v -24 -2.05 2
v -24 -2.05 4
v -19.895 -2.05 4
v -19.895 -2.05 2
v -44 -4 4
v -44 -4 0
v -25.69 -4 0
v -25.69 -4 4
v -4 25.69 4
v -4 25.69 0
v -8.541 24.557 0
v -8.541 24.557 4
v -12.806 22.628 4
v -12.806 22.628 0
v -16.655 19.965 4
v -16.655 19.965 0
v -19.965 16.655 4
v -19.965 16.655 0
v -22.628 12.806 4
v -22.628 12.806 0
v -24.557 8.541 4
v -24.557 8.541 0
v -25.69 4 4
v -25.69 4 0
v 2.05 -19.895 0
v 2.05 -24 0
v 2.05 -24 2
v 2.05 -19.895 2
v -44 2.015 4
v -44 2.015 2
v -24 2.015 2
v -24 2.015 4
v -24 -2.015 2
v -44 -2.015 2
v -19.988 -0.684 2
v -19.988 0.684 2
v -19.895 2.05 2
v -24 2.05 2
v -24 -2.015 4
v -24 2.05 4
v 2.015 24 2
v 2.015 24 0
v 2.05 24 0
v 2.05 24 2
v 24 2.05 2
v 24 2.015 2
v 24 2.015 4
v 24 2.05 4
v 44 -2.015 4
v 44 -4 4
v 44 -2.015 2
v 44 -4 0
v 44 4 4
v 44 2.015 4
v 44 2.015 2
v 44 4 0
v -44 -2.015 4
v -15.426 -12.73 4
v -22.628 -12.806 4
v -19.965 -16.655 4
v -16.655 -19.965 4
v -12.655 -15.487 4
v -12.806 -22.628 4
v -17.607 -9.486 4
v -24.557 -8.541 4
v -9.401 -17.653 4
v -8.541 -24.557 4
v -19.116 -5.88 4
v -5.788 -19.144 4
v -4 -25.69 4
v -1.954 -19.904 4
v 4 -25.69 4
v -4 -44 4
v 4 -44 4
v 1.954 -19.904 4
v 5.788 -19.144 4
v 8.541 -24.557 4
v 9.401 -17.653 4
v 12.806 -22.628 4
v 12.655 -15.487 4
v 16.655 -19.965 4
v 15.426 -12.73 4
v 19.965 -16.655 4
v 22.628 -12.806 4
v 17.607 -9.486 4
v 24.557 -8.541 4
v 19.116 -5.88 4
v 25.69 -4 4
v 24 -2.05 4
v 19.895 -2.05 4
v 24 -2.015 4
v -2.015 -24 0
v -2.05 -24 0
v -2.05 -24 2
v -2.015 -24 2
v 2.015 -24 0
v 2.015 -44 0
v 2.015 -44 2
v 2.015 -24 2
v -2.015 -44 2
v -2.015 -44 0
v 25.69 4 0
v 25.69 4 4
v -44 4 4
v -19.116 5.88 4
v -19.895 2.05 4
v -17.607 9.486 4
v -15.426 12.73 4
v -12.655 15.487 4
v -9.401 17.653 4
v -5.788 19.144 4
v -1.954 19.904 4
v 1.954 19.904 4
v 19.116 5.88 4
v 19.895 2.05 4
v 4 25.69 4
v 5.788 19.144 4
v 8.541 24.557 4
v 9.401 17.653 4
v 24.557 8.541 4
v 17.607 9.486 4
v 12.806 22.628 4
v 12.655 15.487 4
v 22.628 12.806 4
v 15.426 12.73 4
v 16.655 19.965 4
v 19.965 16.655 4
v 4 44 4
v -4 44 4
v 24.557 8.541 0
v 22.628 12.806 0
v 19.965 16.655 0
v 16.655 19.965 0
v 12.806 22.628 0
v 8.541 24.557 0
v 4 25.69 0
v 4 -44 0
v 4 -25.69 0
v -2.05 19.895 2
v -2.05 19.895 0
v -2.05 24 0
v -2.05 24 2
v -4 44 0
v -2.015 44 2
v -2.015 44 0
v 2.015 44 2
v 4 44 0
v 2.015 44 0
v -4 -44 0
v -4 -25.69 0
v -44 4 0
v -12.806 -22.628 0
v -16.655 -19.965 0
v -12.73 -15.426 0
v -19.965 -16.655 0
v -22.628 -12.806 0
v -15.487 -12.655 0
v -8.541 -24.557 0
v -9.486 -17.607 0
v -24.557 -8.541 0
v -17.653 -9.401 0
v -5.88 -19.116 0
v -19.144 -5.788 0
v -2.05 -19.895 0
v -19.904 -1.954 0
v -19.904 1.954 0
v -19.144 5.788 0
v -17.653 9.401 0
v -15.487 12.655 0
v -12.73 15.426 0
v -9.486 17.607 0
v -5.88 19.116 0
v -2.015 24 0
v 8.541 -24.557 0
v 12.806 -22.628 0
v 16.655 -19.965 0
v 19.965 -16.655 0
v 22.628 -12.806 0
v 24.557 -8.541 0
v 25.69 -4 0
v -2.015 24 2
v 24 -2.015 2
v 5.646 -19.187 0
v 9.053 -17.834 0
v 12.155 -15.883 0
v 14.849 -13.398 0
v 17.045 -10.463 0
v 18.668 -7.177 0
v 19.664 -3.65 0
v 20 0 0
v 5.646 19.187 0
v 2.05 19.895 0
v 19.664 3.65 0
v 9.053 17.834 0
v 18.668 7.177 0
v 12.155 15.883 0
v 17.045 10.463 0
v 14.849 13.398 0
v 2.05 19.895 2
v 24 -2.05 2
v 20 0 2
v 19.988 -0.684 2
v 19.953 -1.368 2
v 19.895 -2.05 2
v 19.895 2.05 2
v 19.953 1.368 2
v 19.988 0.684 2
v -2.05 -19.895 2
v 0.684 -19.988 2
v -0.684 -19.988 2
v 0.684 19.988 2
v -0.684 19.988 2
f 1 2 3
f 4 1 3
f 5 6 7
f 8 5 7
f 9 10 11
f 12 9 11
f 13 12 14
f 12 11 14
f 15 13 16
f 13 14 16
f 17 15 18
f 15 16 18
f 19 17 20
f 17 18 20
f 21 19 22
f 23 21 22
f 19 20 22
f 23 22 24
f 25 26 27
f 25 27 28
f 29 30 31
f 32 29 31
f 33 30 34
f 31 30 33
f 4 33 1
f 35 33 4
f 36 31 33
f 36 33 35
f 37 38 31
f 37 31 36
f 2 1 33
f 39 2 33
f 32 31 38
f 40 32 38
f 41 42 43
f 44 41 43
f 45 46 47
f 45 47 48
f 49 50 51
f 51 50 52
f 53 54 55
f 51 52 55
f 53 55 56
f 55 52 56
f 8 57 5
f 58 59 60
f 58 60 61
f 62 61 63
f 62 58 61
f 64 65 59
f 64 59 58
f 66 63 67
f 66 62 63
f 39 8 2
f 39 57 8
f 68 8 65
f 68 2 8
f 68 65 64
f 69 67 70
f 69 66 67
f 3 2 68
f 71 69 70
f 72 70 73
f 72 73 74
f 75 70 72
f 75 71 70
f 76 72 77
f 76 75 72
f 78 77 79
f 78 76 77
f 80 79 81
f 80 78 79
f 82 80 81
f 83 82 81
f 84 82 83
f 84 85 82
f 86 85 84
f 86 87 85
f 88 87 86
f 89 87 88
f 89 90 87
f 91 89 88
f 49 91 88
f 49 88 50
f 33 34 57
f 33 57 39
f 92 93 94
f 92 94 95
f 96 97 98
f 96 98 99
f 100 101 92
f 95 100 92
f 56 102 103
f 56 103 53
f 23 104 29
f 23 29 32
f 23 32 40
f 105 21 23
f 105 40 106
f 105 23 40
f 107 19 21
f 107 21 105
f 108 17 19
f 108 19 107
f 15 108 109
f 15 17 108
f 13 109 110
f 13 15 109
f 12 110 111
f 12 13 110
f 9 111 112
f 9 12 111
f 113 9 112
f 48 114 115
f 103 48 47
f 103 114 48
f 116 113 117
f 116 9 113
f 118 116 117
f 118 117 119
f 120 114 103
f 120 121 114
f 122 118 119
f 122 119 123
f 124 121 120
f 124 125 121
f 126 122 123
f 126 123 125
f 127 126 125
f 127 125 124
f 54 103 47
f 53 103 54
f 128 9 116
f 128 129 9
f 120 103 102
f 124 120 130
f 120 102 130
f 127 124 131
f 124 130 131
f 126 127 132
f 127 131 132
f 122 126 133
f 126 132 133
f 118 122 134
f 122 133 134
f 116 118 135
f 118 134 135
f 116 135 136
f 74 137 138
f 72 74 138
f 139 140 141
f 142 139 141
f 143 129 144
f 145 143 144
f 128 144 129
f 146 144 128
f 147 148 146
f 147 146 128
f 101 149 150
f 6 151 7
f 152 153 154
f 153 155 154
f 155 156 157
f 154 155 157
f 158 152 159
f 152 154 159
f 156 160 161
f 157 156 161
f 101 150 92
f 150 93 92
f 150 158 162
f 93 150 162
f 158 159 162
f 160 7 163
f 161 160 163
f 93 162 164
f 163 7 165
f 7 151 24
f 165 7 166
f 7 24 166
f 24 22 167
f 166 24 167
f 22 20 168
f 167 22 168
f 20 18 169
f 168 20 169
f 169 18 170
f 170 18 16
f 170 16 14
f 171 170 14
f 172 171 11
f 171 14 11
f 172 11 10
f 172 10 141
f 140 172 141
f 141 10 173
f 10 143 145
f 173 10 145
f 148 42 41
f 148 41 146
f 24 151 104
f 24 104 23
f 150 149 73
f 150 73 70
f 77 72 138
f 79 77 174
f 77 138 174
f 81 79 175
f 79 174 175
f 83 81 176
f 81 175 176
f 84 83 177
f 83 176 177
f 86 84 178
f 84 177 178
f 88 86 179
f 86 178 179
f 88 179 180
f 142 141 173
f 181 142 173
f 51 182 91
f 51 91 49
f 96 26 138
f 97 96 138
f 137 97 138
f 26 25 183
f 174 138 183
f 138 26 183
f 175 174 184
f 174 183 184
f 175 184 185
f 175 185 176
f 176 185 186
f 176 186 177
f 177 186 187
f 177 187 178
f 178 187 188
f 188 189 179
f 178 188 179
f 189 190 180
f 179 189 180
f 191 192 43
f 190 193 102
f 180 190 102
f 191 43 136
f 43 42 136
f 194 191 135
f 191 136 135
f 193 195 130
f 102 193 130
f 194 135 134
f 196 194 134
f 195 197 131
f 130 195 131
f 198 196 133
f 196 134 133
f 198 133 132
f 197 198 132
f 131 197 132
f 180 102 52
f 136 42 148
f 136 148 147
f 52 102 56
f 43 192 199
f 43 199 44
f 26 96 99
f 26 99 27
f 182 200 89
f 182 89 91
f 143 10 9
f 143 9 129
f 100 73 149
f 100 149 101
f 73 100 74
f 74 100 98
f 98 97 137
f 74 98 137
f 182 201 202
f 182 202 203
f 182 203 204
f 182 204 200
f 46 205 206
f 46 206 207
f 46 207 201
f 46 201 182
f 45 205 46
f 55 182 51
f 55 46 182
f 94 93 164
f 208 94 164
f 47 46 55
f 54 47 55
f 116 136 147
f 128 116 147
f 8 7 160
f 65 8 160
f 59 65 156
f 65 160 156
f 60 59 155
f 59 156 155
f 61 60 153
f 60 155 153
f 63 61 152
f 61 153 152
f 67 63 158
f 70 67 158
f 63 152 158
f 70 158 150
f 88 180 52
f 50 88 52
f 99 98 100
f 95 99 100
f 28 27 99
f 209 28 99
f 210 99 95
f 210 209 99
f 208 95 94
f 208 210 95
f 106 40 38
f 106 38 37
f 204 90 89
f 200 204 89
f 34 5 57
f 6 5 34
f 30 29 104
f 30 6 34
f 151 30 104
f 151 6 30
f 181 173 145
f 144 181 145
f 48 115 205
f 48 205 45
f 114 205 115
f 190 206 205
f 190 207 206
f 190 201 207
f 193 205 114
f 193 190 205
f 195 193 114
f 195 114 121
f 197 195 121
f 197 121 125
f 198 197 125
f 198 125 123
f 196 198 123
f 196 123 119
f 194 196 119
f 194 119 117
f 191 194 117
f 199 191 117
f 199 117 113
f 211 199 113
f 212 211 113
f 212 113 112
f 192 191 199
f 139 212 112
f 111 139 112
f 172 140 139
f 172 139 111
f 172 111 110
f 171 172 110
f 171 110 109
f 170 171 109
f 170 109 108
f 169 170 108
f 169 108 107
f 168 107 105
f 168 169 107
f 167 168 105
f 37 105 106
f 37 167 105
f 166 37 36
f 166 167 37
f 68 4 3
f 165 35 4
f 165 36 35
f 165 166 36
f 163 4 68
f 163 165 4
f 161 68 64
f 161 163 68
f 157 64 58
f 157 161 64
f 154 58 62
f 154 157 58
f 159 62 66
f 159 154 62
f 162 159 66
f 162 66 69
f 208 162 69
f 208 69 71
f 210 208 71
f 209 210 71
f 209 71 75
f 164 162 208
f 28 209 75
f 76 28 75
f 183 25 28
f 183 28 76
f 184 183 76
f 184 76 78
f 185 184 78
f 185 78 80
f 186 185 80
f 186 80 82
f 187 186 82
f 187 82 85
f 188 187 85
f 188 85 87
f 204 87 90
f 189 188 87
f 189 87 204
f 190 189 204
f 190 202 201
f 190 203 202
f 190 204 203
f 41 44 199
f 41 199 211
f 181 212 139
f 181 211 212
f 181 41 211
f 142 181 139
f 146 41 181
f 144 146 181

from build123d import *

# Parameters (mm, degrees)
SKETCH1_R                       = 26
SKETCH1_R_2                     = 20
RELIEVED_FLOATING_RING_DEPTH    = 4
SKETCH2_W                       = 20
SKETCH2_H                       = 8
X_SLIDE_PAD_1_DEPTH             = 4
SKETCH3_W                       = 8
SKETCH3_H                       = 20
Y_SLIDE_PAD_1_DEPTH             = 4
SKETCH4_W                       = 20
SKETCH4_H                       = 8
X_SLIDE_PAD_1_2_DEPTH           = 4
SKETCH5_W                       = 8
SKETCH5_H                       = 20
Y_SLIDE_PAD_1_2_DEPTH           = 4
SKETCH6_W                       = 4.1
SKETCH6_H                       = 90
LOWER_Y_SLOTS_W4P1_H2_DEPTH     = 2
SKETCH7_W                       = 90
SKETCH7_H                       = 4.1
UPPER_X_SLOTS_W4P1_H2_DEPTH     = 2
BENCH_UPPERX_W4P030_1_1_START   = 2
SKETCH8_W                       = 20
SKETCH8_H                       = 0.045
BENCH_UPPERX_W4P030_1_1_DEPTH   = 2
SKETCH9_W                       = 20
SKETCH9_H                       = 0.045
BENCH_UPPERX_W4P030_1_1_2_DEPTH = 2
SKETCH10_W                      = 20
SKETCH10_H                      = 0.045
BENCH_UPPERX_W4P030_1_1_3_DEPTH = 2
SKETCH11_W                      = 20
SKETCH11_H                      = 0.045
BENCH_UPPERX_W4P030_1_1_4_DEPTH = 2
SKETCH12_W                      = 0.045
SKETCH12_H                      = 20
BENCH_LOWERY_W4P030_1_1_DEPTH   = 2
SKETCH13_W                      = 0.045
SKETCH13_H                      = 20
BENCH_LOWERY_W4P030_1_1_2_DEPTH = 2
SKETCH14_W                      = 0.045
SKETCH14_H                      = 20
BENCH_LOWERY_W4P030_1_1_3_DEPTH = 2
SKETCH15_W                      = 0.045
SKETCH15_H                      = 20
BENCH_LOWERY_W4P030_1_1_4_DEPTH = 2


with BuildPart() as part:
    # Sketch1 → Relieved_Floating_Ring (new body)
    with BuildSketch(Plane.XY):
        Circle(SKETCH1_R)
        Circle(SKETCH1_R_2, mode=Mode.SUBTRACT)
    extrude(amount=RELIEVED_FLOATING_RING_DEPTH)

    # Sketch2 → X_Slide_Pad_-1 (add)
    with BuildSketch(Plane.XY):
        with Locations((-34, 0)):
            Rectangle(SKETCH2_W, SKETCH2_H)
    extrude(amount=X_SLIDE_PAD_1_DEPTH)

    # Sketch3 → Y_Slide_Pad_-1 (add)
    with BuildSketch(Plane.XY):
        with Locations((0, -34)):
            Rectangle(SKETCH3_W, SKETCH3_H)
    extrude(amount=Y_SLIDE_PAD_1_DEPTH)

    # Sketch4 → X_Slide_Pad_1 2 (add)
    with BuildSketch(Plane.XY):
        with Locations((34, 0)):
            Rectangle(SKETCH4_W, SKETCH4_H)
    extrude(amount=X_SLIDE_PAD_1_2_DEPTH)

    # Sketch5 → Y_Slide_Pad_1 2 (add)
    with BuildSketch(Plane.XY):
        with Locations((0, 34)):
            Rectangle(SKETCH5_W, SKETCH5_H)
    extrude(amount=Y_SLIDE_PAD_1_2_DEPTH)

    # Sketch6 → Lower_Y_Slots_W4p1_H2 (cut)
    with BuildSketch(Plane(origin=(0, 0, 0), x_dir=(-1, 0, 0), z_dir=(0, 0, -1))):
        Rectangle(SKETCH6_W, SKETCH6_H)
    extrude(amount=-LOWER_Y_SLOTS_W4P1_H2_DEPTH, mode=Mode.SUBTRACT)

    # Sketch7 → Upper_X_Slots_W4p1_H2 (cut)
    with BuildSketch(Plane.XY.offset(4)):
        Rectangle(SKETCH7_W, SKETCH7_H)
    extrude(amount=-UPPER_X_SLOTS_W4P1_H2_DEPTH, mode=Mode.SUBTRACT)

    # Sketch8 → Bench_UpperX_W4p030_-1_-1 (add)
    with BuildSketch(Plane.XY.offset(BENCH_UPPERX_W4P030_1_1_START)):
        with Locations((-34, -2.0375)):
            Rectangle(SKETCH8_W, SKETCH8_H)
    extrude(amount=BENCH_UPPERX_W4P030_1_1_DEPTH)

    # Sketch9 → Bench_UpperX_W4p030_-1_1 2 (add)
    with BuildSketch(Plane.XY.offset(BENCH_UPPERX_W4P030_1_1_START)):
        with Locations((-34, 2.0375)):
            Rectangle(SKETCH9_W, SKETCH9_H)
    extrude(amount=BENCH_UPPERX_W4P030_1_1_2_DEPTH)

    # Sketch10 → Bench_UpperX_W4p030_1_-1 3 (add)
    with BuildSketch(Plane.XY.offset(BENCH_UPPERX_W4P030_1_1_START)):
        with Locations((34, -2.0375)):
            Rectangle(SKETCH10_W, SKETCH10_H)
    extrude(amount=BENCH_UPPERX_W4P030_1_1_3_DEPTH)

    # Sketch11 → Bench_UpperX_W4p030_1_1 4 (add)
    with BuildSketch(Plane.XY.offset(BENCH_UPPERX_W4P030_1_1_START)):
        with Locations((34, 2.0375)):
            Rectangle(SKETCH11_W, SKETCH11_H)
    extrude(amount=BENCH_UPPERX_W4P030_1_1_4_DEPTH)

    # Sketch12 → Bench_LowerY_W4p030_-1_-1 (add)
    with BuildSketch(Plane.XY):
        with Locations((-2.0375, -34)):
            Rectangle(SKETCH12_W, SKETCH12_H)
    extrude(amount=BENCH_LOWERY_W4P030_1_1_DEPTH)

    # Sketch13 → Bench_LowerY_W4p030_-1_1 2 (add)
    with BuildSketch(Plane.XY):
        with Locations((2.0375, -34)):
            Rectangle(SKETCH13_W, SKETCH13_H)
    extrude(amount=BENCH_LOWERY_W4P030_1_1_2_DEPTH)

    # Sketch14 → Bench_LowerY_W4p030_1_-1 3 (add)
    with BuildSketch(Plane.XY):
        with Locations((-2.0375, 34)):
            Rectangle(SKETCH14_W, SKETCH14_H)
    extrude(amount=BENCH_LOWERY_W4P030_1_1_3_DEPTH)

    # Sketch15 → Bench_LowerY_W4p030_1_1 4 (add)
    with BuildSketch(Plane.XY):
        with Locations((2.0375, 34)):
            Rectangle(SKETCH15_W, SKETCH15_H)
    extrude(amount=BENCH_LOWERY_W4P030_1_1_4_DEPTH)


solid = part.part
